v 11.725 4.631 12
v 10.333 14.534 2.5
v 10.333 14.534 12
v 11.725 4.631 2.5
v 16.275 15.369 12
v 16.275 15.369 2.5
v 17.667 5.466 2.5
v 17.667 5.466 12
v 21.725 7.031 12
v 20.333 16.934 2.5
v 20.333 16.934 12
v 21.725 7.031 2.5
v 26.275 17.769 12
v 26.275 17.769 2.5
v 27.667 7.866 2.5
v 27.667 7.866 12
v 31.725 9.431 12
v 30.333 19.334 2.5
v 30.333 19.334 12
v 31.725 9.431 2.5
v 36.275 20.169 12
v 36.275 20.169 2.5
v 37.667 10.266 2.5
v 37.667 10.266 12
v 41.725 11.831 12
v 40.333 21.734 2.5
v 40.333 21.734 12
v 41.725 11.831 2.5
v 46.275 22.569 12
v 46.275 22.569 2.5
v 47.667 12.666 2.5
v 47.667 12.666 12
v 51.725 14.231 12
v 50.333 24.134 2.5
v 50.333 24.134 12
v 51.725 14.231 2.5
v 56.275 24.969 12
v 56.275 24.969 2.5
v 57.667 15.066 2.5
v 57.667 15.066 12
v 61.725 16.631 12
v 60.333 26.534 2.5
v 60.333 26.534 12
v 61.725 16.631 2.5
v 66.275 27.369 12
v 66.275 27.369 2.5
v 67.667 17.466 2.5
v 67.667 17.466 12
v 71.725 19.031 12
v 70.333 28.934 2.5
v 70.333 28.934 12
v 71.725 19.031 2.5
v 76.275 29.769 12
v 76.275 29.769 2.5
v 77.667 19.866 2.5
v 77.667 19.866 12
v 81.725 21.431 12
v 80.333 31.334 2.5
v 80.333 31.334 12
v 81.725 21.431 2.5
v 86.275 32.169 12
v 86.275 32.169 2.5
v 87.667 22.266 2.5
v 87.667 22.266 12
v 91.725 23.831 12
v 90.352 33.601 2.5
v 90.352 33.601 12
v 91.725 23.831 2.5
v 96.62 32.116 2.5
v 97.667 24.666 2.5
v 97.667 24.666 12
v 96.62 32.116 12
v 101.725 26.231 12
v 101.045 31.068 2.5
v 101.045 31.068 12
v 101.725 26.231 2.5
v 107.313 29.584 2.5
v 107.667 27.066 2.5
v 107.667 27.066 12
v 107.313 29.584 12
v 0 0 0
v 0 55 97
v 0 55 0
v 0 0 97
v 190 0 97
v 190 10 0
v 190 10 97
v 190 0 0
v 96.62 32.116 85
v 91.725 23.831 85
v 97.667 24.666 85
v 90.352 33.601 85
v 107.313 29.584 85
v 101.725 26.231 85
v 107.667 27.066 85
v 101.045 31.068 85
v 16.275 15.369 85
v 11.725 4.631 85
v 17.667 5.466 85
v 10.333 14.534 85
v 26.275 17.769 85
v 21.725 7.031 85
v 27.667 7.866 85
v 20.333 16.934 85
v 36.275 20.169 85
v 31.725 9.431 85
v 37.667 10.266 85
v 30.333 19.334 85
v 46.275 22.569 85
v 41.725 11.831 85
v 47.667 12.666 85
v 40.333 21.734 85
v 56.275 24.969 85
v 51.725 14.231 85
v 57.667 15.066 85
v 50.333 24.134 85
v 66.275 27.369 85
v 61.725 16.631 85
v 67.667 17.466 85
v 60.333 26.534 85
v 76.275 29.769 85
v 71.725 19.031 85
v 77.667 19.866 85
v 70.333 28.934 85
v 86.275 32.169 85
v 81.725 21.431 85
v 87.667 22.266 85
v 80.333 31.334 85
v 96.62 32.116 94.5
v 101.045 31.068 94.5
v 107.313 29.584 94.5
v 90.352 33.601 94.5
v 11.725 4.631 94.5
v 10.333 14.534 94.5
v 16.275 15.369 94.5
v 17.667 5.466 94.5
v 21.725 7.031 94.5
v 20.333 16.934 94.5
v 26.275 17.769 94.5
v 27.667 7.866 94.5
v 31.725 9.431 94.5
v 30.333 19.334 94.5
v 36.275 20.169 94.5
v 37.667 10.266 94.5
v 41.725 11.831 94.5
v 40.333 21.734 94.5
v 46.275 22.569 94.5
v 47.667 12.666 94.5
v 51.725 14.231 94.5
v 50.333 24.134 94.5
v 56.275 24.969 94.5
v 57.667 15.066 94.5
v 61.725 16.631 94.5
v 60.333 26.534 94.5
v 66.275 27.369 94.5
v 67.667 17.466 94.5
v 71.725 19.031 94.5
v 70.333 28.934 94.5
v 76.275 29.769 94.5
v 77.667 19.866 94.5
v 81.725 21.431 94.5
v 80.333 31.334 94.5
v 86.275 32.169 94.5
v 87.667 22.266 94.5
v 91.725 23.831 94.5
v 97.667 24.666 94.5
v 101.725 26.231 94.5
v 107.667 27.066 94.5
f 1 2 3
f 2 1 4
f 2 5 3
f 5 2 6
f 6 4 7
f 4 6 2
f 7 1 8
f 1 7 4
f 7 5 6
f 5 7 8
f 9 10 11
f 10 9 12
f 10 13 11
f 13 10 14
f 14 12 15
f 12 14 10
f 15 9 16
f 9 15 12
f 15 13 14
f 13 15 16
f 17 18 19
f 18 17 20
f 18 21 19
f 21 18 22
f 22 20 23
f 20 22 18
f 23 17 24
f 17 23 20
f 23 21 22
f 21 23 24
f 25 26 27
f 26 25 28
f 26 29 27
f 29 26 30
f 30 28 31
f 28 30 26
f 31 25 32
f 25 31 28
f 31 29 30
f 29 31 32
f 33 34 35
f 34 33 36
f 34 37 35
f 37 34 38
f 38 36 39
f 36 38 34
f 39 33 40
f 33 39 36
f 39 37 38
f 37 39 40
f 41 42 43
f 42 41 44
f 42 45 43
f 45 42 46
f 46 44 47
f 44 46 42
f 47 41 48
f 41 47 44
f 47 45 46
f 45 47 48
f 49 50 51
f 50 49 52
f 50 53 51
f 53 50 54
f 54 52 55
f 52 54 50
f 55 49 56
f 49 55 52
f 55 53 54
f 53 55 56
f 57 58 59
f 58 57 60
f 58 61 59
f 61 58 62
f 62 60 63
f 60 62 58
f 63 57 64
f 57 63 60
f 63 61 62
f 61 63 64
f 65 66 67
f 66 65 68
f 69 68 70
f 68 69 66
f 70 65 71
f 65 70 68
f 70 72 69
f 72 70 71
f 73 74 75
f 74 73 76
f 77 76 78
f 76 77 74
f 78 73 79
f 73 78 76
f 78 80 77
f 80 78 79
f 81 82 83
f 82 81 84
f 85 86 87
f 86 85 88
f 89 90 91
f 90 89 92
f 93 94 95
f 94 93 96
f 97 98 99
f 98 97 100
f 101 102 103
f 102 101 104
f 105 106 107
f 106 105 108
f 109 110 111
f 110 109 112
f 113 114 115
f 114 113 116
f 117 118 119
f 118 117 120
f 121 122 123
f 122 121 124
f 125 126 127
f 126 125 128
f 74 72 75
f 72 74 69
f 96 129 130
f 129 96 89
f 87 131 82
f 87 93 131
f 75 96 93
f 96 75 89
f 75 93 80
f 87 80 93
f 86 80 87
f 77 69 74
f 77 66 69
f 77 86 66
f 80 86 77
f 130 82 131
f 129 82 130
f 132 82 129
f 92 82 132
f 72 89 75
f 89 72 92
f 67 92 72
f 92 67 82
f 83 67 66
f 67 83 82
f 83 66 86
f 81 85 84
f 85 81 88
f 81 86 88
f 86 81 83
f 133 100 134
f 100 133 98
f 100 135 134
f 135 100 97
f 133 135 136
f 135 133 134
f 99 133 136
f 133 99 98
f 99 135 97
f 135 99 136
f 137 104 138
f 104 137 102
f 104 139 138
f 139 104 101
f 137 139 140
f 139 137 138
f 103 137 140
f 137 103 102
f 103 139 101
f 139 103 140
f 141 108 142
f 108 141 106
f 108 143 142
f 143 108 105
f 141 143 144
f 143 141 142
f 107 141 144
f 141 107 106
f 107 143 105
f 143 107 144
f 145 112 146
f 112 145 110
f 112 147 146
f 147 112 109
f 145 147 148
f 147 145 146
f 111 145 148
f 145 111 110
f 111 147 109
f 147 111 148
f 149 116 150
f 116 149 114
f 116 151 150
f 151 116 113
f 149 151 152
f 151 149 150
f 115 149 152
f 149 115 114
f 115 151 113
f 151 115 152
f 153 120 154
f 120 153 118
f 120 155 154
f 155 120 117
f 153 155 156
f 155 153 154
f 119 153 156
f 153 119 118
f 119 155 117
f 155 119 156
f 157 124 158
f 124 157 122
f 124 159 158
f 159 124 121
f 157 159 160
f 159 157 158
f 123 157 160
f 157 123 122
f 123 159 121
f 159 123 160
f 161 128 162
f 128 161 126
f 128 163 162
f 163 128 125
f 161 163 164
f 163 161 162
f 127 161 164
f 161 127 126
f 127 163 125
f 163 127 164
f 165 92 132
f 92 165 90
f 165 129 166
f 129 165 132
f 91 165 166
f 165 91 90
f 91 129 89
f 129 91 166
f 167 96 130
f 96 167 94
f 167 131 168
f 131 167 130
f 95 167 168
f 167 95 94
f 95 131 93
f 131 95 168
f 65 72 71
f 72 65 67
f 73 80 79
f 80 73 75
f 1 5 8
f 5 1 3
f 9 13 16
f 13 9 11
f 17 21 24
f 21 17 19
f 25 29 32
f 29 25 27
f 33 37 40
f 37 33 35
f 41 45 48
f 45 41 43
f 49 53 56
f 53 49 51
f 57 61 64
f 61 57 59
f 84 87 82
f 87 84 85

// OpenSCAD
// LadderLevel Template B — Heavy duty thicker walls
$fn=32;
L=190; W=85; Hmax=55; Hmin=10;
module wedge(){
  difference(){
    linear_extrude(W) polygon([[0,0],[L,0],[L,Hmin],[0,Hmax]]);
    for(i=[0:16]) translate([14+i*10, Hmin+i*2.4, W/2-20])
      rotate([0,0,8]) cube([6,10,40], center=true);
    translate([25,Hmax-4,12]) cube([100,5,W-24]);
  }
}
wedge();
translate([0,0,W+12]) mirror([0,0,1]) wedge();
